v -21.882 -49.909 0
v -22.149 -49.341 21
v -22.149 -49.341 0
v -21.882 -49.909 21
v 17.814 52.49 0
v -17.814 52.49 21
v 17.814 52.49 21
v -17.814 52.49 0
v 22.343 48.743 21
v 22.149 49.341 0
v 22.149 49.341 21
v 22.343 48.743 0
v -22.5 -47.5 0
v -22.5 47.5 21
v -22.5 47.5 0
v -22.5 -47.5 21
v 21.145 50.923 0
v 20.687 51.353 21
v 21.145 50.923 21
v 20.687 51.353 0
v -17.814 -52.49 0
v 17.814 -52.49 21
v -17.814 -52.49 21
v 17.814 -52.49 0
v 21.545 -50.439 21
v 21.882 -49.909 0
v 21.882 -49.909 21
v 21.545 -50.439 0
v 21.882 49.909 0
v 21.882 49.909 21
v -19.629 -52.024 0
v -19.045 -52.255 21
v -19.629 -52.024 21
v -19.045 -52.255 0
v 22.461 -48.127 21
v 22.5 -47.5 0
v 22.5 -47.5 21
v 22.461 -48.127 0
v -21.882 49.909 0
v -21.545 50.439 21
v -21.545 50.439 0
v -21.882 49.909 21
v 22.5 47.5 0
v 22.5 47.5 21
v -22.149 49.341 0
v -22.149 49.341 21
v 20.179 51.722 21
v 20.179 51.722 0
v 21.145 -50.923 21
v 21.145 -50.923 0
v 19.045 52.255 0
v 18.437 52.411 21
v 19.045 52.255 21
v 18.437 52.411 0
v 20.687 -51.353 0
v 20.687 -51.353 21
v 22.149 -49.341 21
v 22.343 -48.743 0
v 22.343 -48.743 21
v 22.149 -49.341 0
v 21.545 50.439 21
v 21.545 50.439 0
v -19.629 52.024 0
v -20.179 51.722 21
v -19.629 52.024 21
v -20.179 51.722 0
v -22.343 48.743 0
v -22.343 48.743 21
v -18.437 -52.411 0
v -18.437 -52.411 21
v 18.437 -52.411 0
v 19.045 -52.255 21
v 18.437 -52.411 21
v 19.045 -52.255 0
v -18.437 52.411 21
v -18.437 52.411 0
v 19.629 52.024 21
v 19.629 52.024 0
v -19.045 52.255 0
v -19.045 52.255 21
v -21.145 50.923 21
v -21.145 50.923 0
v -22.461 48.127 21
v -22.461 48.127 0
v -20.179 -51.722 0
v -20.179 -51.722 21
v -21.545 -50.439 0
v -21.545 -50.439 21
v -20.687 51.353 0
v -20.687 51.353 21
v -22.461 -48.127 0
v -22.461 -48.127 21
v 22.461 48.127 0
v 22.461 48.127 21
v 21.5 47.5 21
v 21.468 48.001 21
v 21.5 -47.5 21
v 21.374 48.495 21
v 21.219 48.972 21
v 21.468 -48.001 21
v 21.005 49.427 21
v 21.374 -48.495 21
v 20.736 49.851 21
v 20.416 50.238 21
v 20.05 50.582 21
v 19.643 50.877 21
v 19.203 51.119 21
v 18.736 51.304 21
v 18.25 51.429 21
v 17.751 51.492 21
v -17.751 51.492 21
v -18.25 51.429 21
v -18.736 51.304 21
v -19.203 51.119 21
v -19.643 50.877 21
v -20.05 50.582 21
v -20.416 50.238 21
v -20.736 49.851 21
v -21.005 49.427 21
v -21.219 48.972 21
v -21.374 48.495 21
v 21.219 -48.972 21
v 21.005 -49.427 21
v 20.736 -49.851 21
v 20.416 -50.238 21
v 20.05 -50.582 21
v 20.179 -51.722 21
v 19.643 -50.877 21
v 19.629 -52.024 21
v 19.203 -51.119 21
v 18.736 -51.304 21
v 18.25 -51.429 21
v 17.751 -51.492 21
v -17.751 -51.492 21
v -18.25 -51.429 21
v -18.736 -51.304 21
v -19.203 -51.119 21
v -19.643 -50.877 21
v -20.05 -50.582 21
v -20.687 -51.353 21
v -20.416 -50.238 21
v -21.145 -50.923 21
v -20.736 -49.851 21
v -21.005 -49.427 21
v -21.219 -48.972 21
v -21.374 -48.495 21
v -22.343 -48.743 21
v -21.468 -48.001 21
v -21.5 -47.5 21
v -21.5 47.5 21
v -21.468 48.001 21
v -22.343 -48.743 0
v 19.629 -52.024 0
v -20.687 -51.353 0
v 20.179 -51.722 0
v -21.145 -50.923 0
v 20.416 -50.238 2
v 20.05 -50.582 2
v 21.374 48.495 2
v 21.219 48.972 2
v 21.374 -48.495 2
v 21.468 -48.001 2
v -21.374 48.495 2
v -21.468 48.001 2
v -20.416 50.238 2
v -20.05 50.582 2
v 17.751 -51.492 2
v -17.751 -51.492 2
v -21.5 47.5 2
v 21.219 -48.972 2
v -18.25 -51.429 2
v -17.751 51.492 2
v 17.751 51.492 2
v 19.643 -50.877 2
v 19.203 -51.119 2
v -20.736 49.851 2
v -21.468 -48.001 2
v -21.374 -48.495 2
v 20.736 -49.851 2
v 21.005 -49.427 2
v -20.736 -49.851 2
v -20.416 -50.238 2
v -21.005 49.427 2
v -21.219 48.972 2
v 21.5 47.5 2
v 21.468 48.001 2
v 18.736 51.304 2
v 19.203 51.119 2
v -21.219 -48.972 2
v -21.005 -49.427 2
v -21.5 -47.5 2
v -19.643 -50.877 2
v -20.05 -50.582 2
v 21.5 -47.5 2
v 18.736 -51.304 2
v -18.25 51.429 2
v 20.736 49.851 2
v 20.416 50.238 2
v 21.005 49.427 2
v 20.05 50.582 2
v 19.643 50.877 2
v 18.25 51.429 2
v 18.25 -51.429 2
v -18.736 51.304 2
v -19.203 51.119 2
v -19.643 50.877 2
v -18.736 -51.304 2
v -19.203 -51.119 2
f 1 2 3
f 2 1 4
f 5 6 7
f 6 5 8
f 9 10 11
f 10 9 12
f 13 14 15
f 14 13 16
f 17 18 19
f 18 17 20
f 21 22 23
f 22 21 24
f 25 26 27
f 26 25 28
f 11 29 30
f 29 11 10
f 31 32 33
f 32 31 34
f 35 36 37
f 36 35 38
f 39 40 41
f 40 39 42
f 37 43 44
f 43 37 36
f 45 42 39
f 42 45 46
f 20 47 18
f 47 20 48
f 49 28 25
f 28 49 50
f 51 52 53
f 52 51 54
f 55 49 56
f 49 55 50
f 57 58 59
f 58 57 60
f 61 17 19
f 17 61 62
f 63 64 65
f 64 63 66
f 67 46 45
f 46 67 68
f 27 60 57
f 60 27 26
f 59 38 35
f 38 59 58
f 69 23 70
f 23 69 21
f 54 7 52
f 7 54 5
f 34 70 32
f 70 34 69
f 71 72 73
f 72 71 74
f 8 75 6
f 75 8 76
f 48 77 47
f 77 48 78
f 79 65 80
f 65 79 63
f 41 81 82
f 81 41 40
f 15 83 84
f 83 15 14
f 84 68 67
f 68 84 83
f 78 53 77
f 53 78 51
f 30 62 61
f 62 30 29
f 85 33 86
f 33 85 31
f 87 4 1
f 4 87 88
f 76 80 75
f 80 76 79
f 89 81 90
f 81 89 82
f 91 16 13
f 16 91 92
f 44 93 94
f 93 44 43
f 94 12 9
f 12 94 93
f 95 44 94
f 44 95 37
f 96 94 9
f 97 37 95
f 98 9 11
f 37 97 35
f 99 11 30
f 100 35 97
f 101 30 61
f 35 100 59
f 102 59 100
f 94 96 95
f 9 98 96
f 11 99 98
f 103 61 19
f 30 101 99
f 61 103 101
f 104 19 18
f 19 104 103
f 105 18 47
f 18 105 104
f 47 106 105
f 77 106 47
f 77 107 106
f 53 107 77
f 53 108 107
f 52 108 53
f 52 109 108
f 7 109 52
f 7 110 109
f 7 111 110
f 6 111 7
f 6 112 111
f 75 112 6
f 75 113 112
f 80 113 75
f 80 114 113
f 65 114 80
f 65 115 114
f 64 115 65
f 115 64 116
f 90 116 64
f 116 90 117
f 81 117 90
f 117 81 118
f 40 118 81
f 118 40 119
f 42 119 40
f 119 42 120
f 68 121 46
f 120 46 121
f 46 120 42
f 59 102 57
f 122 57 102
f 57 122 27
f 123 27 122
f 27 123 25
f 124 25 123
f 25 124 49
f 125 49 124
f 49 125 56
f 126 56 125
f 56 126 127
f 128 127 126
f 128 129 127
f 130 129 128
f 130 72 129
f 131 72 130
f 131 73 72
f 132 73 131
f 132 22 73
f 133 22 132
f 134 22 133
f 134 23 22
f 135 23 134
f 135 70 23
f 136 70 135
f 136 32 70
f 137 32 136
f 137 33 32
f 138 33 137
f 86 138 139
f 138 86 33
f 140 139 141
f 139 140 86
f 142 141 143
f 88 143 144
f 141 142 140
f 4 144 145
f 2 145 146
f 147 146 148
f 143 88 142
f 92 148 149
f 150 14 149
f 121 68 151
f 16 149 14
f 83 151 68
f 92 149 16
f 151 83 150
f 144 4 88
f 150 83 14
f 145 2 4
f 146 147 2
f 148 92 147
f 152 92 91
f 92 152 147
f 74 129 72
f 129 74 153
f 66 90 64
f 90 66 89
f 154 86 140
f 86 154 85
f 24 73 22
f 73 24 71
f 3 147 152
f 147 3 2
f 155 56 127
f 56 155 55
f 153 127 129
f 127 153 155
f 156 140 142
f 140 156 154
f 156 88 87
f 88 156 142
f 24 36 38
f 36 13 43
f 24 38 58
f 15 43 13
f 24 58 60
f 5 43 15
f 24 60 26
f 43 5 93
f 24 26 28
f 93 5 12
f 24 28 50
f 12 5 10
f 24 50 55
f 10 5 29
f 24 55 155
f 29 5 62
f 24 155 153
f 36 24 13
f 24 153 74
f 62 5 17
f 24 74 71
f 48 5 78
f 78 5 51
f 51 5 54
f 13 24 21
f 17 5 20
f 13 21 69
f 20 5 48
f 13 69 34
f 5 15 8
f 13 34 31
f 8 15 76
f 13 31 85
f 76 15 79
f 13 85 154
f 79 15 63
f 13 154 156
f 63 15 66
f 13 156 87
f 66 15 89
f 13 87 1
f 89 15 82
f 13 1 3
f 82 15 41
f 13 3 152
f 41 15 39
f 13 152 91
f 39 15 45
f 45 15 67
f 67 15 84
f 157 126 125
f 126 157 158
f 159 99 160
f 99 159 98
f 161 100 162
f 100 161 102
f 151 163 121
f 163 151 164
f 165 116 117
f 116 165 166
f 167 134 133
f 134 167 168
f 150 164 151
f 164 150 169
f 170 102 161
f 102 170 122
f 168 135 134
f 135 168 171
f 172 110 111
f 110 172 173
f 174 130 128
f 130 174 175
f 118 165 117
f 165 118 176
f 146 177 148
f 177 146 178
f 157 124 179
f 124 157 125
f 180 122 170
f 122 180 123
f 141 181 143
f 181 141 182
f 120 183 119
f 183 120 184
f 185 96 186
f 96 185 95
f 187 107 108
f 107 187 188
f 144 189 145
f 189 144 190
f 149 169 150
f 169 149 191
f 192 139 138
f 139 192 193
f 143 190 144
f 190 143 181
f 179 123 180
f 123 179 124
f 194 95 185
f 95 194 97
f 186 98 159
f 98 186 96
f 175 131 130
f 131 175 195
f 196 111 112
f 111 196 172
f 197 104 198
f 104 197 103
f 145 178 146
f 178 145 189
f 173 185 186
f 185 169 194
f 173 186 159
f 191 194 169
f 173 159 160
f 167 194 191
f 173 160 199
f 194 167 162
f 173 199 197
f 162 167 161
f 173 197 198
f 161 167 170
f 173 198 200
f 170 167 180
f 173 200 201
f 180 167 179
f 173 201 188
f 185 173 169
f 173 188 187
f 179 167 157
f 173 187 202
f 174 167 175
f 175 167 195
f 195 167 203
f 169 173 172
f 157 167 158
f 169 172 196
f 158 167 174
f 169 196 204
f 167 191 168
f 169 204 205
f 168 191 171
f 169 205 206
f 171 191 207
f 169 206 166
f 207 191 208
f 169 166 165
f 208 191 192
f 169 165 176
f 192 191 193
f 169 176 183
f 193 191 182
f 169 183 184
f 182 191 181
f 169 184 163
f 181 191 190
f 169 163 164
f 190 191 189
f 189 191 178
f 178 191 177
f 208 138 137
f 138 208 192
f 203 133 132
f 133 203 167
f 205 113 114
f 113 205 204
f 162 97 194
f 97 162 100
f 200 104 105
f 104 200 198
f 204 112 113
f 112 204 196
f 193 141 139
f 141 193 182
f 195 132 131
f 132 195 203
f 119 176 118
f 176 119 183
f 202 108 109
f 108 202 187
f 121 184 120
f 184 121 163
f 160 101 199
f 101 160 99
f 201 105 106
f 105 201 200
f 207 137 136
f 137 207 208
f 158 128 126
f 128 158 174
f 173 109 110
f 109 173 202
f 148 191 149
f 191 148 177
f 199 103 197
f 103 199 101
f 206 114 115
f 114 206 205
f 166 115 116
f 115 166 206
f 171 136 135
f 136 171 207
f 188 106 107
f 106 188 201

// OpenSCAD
$fn = 50;


difference() {
	union() {
		hull() {
			translate(v = [-17.5000000000, 47.5000000000, 0]) {
				cylinder(h = 21, r = 5);
			}
			translate(v = [17.5000000000, 47.5000000000, 0]) {
				cylinder(h = 21, r = 5);
			}
			translate(v = [-17.5000000000, -47.5000000000, 0]) {
				cylinder(h = 21, r = 5);
			}
			translate(v = [17.5000000000, -47.5000000000, 0]) {
				cylinder(h = 21, r = 5);
			}
		}
	}
	union() {
		translate(v = [0, 0, 2]) {
			hull() {
				translate(v = [-17.5000000000, 47.5000000000, 0]) {
					cylinder(h = 19, r = 4);
				}
				translate(v = [17.5000000000, 47.5000000000, 0]) {
					cylinder(h = 19, r = 4);
				}
				translate(v = [-17.5000000000, -47.5000000000, 0]) {
					cylinder(h = 19, r = 4);
				}
				translate(v = [17.5000000000, -47.5000000000, 0]) {
					cylinder(h = 19, r = 4);
				}
			}
		}
	}
}
